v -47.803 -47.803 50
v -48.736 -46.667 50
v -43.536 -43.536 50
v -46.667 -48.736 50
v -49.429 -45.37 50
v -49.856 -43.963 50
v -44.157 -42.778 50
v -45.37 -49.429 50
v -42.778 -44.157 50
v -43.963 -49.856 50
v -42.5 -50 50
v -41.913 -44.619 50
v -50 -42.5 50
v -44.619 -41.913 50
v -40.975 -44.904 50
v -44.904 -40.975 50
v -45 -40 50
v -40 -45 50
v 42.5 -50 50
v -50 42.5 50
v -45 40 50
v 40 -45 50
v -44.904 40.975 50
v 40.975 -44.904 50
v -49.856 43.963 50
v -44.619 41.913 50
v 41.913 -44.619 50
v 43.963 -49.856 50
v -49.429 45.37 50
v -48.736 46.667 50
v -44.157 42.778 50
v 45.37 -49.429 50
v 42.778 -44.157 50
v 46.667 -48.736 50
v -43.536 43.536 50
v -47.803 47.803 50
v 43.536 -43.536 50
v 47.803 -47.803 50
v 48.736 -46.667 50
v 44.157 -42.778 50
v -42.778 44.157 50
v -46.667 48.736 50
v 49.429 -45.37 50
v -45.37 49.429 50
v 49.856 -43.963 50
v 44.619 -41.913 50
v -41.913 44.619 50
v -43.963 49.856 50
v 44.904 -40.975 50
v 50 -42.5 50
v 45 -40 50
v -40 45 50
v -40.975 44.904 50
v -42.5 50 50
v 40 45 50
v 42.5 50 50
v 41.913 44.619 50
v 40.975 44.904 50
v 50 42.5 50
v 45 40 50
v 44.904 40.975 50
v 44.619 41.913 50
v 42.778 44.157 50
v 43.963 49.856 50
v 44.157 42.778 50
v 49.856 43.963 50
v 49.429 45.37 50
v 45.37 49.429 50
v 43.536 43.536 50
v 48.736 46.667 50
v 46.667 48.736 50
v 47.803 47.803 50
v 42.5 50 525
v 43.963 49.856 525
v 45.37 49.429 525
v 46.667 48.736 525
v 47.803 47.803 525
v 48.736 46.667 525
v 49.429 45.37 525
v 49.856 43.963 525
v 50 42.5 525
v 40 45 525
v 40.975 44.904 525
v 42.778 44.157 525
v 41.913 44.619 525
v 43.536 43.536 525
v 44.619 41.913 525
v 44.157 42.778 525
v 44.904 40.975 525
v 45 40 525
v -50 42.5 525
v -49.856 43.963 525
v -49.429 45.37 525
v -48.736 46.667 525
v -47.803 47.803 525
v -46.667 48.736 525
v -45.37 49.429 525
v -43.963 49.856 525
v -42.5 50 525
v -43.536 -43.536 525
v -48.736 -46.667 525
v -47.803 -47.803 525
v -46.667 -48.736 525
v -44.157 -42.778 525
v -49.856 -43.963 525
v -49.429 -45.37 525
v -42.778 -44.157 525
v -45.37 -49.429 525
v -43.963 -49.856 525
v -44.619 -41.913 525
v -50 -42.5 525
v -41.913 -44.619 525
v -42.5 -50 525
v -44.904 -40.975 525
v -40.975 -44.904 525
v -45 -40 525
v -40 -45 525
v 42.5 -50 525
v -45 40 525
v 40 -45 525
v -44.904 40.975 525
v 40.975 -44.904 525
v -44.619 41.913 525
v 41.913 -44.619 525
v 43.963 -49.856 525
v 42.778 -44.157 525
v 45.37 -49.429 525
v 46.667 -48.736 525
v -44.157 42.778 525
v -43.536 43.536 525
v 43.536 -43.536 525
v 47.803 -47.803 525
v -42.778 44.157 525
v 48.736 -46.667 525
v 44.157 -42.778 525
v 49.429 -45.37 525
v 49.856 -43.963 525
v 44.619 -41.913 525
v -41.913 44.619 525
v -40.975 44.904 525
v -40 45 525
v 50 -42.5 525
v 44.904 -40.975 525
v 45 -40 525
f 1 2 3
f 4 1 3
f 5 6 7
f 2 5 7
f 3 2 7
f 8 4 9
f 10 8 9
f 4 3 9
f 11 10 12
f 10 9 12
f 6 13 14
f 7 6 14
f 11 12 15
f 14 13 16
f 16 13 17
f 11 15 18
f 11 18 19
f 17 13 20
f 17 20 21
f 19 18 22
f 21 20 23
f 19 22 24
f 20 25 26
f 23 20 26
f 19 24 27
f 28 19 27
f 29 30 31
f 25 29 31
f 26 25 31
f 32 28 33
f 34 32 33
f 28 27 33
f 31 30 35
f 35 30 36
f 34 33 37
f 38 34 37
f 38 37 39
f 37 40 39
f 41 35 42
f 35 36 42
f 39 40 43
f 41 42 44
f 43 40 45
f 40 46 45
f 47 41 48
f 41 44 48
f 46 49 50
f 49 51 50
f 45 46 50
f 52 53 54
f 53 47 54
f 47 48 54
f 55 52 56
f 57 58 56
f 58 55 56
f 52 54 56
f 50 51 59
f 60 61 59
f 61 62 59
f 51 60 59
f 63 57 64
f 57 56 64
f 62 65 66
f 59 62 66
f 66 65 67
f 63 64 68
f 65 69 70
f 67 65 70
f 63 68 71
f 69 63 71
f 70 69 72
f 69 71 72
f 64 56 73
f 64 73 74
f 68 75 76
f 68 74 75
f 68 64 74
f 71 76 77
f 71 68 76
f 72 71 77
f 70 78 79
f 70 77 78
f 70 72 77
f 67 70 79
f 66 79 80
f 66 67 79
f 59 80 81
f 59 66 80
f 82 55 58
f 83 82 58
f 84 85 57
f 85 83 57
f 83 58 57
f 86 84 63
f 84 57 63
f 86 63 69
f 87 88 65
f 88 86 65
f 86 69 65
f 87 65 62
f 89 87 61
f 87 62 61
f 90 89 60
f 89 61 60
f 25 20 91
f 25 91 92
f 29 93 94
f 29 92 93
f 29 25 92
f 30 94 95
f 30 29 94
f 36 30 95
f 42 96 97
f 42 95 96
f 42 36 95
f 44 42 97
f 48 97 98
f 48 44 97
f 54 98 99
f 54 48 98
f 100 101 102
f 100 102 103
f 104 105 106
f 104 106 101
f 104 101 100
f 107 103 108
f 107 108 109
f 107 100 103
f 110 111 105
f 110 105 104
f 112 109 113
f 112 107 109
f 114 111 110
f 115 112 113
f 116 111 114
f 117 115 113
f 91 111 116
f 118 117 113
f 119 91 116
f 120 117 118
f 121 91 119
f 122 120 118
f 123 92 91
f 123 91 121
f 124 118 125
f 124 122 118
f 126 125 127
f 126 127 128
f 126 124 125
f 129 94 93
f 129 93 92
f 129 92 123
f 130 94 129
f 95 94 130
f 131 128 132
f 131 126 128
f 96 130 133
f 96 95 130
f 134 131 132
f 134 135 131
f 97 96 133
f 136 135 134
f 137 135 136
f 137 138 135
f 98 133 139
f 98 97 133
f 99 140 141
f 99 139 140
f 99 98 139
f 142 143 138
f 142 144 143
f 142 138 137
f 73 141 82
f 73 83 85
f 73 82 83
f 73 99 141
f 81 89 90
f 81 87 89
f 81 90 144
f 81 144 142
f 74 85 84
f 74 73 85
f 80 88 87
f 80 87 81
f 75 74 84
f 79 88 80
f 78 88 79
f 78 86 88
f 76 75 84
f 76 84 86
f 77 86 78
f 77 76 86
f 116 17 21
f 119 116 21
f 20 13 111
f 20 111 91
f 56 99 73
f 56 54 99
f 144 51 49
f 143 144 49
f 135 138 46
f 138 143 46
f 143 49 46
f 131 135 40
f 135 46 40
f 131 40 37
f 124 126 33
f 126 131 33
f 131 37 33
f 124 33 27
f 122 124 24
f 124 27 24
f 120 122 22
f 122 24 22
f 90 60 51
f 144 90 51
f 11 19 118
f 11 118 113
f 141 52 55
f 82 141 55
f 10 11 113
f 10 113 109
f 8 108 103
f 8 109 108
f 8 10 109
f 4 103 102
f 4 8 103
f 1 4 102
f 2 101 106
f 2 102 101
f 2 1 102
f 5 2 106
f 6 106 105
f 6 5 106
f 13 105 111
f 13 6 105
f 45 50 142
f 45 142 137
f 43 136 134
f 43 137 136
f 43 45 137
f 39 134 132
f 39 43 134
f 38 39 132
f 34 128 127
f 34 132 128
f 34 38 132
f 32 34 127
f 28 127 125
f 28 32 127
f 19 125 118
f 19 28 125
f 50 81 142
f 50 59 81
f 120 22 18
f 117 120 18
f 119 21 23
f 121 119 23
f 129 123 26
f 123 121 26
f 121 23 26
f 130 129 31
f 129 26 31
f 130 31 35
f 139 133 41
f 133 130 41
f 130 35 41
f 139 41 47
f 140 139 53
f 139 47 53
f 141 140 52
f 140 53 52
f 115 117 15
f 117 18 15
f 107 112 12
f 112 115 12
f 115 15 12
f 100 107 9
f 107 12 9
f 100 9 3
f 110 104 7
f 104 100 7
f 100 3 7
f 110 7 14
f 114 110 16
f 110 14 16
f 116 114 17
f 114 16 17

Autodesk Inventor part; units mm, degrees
ref_plane "Start Plane" through (0, 0, 50) normal (0, 0, 1) x (1, 0, 0)
ref_plane "End Plane" through (0, 0, 525) normal (0, 0, 1) x (1, 0, 0)
sketch "Sketch" plane through (0, 0, 0) normal (0, 0, 1) x (1, 0, 0)
  line L0 (-50, -42.5) -> (-50, 42.5)
  line L1 (-42.5, 50) -> (42.5, 50)
  line L2 (50, 42.5) -> (50, -42.5)
  line L3 (42.5, -50) -> (-42.5, -50)
  arc A0 (-50, -42.5) -> (-42.5, -50) centre (-42.5, -42.5) ccw
  arc A1 (-42.5, 50) -> (-50, 42.5) centre (-42.5, 42.5) ccw
  arc A2 (50, 42.5) -> (42.5, 50) centre (42.5, 42.5) ccw
  arc A3 (42.5, -50) -> (50, -42.5) centre (42.5, -42.5) ccw
  line L4 (-40, 45) -> (40, 45)
  line L5 (45, 40) -> (45, -40)
  line L6 (40, -45) -> (-40, -45)
  line L7 (-45, -40) -> (-45, 40)
  line L8 (0, 72.1746) -> (0, -72.1746) construction
  line L9 (-72.1746, 0) -> (72.1746, 0) construction
  arc A4 (-45, -40) -> (-40, -45) centre (-40, -40) ccw
  arc A5 (-40, 45) -> (-45, 40) centre (-40, 40) ccw
  arc A6 (45, 40) -> (40, 45) centre (40, 40) ccw
  arc A7 (40, -45) -> (45, -40) centre (40, -40) ccw
  dimension "d7" = 7.5
  dimension "d10" = 100
  dimension "d11" = 100
  dimension "d12" = 5
  dimension "d15" = 50
  dimension "d16" = 50
  dimension "d19" = 5
  dimension "d20" = 5
extrude "Body" add sketch "Sketch" along normal up to surface (475 mm away) from surface at 50
sketch "Sketch3" plane through (0, 0, 0) normal (0, 0, 1) x (1, 0, 0)
  line L0 (0, 0) -> (10, 0)
ref_plane "Work Plane3" through (0, 0, 0) normal (0, -1, 0) x (1, 0, 0)
ref_plane "Work Plane4" through (42.5, -515, 50) normal (0, 0, -1) x (-1, 0, 0)
split "Split1" plane through (42.5, -515, 50) removes the side toward (0, 0, -1)
sketch "Sketch4" plane through (0, 0, 0) normal (0, -1, 0) x (1, 0, 0)
  line L0 (-2, 50) -> (12, 50) projected
  line L1 (-2, 525) -> (12, 525) projected
  dimension "d18" = 475
equation "\"d7\" = G_IR"
equation "\"d10\" = G_H"
equation "\"d11\" = G_W"
equation "\"d12\" = G_T"
equation "\"d15\" = 0.5 * d10"
equation "\"d16\" = 0.5 * d11"
equation "\"d19\" = G_T"
equation "\"d20\" = G_T"
equation "\"d3\" = G_L"
equation "\"G_W\" = 100"
equation "\"G_H\" = 100"
equation "\"G_T\" = 5"
equation "\"G_IR\" = 7.5"
equation "\"G_L\" = d18"
equation "\"G_OFFSET_END\" = 0"
equation "\"d14\" = G_OFFSET_END + B_L"
equation "\"B_L\" = 525"
properties part number "DIN EN 10210-2 - 100 x 100 x 5 - 475" material "Steel, Mild"
